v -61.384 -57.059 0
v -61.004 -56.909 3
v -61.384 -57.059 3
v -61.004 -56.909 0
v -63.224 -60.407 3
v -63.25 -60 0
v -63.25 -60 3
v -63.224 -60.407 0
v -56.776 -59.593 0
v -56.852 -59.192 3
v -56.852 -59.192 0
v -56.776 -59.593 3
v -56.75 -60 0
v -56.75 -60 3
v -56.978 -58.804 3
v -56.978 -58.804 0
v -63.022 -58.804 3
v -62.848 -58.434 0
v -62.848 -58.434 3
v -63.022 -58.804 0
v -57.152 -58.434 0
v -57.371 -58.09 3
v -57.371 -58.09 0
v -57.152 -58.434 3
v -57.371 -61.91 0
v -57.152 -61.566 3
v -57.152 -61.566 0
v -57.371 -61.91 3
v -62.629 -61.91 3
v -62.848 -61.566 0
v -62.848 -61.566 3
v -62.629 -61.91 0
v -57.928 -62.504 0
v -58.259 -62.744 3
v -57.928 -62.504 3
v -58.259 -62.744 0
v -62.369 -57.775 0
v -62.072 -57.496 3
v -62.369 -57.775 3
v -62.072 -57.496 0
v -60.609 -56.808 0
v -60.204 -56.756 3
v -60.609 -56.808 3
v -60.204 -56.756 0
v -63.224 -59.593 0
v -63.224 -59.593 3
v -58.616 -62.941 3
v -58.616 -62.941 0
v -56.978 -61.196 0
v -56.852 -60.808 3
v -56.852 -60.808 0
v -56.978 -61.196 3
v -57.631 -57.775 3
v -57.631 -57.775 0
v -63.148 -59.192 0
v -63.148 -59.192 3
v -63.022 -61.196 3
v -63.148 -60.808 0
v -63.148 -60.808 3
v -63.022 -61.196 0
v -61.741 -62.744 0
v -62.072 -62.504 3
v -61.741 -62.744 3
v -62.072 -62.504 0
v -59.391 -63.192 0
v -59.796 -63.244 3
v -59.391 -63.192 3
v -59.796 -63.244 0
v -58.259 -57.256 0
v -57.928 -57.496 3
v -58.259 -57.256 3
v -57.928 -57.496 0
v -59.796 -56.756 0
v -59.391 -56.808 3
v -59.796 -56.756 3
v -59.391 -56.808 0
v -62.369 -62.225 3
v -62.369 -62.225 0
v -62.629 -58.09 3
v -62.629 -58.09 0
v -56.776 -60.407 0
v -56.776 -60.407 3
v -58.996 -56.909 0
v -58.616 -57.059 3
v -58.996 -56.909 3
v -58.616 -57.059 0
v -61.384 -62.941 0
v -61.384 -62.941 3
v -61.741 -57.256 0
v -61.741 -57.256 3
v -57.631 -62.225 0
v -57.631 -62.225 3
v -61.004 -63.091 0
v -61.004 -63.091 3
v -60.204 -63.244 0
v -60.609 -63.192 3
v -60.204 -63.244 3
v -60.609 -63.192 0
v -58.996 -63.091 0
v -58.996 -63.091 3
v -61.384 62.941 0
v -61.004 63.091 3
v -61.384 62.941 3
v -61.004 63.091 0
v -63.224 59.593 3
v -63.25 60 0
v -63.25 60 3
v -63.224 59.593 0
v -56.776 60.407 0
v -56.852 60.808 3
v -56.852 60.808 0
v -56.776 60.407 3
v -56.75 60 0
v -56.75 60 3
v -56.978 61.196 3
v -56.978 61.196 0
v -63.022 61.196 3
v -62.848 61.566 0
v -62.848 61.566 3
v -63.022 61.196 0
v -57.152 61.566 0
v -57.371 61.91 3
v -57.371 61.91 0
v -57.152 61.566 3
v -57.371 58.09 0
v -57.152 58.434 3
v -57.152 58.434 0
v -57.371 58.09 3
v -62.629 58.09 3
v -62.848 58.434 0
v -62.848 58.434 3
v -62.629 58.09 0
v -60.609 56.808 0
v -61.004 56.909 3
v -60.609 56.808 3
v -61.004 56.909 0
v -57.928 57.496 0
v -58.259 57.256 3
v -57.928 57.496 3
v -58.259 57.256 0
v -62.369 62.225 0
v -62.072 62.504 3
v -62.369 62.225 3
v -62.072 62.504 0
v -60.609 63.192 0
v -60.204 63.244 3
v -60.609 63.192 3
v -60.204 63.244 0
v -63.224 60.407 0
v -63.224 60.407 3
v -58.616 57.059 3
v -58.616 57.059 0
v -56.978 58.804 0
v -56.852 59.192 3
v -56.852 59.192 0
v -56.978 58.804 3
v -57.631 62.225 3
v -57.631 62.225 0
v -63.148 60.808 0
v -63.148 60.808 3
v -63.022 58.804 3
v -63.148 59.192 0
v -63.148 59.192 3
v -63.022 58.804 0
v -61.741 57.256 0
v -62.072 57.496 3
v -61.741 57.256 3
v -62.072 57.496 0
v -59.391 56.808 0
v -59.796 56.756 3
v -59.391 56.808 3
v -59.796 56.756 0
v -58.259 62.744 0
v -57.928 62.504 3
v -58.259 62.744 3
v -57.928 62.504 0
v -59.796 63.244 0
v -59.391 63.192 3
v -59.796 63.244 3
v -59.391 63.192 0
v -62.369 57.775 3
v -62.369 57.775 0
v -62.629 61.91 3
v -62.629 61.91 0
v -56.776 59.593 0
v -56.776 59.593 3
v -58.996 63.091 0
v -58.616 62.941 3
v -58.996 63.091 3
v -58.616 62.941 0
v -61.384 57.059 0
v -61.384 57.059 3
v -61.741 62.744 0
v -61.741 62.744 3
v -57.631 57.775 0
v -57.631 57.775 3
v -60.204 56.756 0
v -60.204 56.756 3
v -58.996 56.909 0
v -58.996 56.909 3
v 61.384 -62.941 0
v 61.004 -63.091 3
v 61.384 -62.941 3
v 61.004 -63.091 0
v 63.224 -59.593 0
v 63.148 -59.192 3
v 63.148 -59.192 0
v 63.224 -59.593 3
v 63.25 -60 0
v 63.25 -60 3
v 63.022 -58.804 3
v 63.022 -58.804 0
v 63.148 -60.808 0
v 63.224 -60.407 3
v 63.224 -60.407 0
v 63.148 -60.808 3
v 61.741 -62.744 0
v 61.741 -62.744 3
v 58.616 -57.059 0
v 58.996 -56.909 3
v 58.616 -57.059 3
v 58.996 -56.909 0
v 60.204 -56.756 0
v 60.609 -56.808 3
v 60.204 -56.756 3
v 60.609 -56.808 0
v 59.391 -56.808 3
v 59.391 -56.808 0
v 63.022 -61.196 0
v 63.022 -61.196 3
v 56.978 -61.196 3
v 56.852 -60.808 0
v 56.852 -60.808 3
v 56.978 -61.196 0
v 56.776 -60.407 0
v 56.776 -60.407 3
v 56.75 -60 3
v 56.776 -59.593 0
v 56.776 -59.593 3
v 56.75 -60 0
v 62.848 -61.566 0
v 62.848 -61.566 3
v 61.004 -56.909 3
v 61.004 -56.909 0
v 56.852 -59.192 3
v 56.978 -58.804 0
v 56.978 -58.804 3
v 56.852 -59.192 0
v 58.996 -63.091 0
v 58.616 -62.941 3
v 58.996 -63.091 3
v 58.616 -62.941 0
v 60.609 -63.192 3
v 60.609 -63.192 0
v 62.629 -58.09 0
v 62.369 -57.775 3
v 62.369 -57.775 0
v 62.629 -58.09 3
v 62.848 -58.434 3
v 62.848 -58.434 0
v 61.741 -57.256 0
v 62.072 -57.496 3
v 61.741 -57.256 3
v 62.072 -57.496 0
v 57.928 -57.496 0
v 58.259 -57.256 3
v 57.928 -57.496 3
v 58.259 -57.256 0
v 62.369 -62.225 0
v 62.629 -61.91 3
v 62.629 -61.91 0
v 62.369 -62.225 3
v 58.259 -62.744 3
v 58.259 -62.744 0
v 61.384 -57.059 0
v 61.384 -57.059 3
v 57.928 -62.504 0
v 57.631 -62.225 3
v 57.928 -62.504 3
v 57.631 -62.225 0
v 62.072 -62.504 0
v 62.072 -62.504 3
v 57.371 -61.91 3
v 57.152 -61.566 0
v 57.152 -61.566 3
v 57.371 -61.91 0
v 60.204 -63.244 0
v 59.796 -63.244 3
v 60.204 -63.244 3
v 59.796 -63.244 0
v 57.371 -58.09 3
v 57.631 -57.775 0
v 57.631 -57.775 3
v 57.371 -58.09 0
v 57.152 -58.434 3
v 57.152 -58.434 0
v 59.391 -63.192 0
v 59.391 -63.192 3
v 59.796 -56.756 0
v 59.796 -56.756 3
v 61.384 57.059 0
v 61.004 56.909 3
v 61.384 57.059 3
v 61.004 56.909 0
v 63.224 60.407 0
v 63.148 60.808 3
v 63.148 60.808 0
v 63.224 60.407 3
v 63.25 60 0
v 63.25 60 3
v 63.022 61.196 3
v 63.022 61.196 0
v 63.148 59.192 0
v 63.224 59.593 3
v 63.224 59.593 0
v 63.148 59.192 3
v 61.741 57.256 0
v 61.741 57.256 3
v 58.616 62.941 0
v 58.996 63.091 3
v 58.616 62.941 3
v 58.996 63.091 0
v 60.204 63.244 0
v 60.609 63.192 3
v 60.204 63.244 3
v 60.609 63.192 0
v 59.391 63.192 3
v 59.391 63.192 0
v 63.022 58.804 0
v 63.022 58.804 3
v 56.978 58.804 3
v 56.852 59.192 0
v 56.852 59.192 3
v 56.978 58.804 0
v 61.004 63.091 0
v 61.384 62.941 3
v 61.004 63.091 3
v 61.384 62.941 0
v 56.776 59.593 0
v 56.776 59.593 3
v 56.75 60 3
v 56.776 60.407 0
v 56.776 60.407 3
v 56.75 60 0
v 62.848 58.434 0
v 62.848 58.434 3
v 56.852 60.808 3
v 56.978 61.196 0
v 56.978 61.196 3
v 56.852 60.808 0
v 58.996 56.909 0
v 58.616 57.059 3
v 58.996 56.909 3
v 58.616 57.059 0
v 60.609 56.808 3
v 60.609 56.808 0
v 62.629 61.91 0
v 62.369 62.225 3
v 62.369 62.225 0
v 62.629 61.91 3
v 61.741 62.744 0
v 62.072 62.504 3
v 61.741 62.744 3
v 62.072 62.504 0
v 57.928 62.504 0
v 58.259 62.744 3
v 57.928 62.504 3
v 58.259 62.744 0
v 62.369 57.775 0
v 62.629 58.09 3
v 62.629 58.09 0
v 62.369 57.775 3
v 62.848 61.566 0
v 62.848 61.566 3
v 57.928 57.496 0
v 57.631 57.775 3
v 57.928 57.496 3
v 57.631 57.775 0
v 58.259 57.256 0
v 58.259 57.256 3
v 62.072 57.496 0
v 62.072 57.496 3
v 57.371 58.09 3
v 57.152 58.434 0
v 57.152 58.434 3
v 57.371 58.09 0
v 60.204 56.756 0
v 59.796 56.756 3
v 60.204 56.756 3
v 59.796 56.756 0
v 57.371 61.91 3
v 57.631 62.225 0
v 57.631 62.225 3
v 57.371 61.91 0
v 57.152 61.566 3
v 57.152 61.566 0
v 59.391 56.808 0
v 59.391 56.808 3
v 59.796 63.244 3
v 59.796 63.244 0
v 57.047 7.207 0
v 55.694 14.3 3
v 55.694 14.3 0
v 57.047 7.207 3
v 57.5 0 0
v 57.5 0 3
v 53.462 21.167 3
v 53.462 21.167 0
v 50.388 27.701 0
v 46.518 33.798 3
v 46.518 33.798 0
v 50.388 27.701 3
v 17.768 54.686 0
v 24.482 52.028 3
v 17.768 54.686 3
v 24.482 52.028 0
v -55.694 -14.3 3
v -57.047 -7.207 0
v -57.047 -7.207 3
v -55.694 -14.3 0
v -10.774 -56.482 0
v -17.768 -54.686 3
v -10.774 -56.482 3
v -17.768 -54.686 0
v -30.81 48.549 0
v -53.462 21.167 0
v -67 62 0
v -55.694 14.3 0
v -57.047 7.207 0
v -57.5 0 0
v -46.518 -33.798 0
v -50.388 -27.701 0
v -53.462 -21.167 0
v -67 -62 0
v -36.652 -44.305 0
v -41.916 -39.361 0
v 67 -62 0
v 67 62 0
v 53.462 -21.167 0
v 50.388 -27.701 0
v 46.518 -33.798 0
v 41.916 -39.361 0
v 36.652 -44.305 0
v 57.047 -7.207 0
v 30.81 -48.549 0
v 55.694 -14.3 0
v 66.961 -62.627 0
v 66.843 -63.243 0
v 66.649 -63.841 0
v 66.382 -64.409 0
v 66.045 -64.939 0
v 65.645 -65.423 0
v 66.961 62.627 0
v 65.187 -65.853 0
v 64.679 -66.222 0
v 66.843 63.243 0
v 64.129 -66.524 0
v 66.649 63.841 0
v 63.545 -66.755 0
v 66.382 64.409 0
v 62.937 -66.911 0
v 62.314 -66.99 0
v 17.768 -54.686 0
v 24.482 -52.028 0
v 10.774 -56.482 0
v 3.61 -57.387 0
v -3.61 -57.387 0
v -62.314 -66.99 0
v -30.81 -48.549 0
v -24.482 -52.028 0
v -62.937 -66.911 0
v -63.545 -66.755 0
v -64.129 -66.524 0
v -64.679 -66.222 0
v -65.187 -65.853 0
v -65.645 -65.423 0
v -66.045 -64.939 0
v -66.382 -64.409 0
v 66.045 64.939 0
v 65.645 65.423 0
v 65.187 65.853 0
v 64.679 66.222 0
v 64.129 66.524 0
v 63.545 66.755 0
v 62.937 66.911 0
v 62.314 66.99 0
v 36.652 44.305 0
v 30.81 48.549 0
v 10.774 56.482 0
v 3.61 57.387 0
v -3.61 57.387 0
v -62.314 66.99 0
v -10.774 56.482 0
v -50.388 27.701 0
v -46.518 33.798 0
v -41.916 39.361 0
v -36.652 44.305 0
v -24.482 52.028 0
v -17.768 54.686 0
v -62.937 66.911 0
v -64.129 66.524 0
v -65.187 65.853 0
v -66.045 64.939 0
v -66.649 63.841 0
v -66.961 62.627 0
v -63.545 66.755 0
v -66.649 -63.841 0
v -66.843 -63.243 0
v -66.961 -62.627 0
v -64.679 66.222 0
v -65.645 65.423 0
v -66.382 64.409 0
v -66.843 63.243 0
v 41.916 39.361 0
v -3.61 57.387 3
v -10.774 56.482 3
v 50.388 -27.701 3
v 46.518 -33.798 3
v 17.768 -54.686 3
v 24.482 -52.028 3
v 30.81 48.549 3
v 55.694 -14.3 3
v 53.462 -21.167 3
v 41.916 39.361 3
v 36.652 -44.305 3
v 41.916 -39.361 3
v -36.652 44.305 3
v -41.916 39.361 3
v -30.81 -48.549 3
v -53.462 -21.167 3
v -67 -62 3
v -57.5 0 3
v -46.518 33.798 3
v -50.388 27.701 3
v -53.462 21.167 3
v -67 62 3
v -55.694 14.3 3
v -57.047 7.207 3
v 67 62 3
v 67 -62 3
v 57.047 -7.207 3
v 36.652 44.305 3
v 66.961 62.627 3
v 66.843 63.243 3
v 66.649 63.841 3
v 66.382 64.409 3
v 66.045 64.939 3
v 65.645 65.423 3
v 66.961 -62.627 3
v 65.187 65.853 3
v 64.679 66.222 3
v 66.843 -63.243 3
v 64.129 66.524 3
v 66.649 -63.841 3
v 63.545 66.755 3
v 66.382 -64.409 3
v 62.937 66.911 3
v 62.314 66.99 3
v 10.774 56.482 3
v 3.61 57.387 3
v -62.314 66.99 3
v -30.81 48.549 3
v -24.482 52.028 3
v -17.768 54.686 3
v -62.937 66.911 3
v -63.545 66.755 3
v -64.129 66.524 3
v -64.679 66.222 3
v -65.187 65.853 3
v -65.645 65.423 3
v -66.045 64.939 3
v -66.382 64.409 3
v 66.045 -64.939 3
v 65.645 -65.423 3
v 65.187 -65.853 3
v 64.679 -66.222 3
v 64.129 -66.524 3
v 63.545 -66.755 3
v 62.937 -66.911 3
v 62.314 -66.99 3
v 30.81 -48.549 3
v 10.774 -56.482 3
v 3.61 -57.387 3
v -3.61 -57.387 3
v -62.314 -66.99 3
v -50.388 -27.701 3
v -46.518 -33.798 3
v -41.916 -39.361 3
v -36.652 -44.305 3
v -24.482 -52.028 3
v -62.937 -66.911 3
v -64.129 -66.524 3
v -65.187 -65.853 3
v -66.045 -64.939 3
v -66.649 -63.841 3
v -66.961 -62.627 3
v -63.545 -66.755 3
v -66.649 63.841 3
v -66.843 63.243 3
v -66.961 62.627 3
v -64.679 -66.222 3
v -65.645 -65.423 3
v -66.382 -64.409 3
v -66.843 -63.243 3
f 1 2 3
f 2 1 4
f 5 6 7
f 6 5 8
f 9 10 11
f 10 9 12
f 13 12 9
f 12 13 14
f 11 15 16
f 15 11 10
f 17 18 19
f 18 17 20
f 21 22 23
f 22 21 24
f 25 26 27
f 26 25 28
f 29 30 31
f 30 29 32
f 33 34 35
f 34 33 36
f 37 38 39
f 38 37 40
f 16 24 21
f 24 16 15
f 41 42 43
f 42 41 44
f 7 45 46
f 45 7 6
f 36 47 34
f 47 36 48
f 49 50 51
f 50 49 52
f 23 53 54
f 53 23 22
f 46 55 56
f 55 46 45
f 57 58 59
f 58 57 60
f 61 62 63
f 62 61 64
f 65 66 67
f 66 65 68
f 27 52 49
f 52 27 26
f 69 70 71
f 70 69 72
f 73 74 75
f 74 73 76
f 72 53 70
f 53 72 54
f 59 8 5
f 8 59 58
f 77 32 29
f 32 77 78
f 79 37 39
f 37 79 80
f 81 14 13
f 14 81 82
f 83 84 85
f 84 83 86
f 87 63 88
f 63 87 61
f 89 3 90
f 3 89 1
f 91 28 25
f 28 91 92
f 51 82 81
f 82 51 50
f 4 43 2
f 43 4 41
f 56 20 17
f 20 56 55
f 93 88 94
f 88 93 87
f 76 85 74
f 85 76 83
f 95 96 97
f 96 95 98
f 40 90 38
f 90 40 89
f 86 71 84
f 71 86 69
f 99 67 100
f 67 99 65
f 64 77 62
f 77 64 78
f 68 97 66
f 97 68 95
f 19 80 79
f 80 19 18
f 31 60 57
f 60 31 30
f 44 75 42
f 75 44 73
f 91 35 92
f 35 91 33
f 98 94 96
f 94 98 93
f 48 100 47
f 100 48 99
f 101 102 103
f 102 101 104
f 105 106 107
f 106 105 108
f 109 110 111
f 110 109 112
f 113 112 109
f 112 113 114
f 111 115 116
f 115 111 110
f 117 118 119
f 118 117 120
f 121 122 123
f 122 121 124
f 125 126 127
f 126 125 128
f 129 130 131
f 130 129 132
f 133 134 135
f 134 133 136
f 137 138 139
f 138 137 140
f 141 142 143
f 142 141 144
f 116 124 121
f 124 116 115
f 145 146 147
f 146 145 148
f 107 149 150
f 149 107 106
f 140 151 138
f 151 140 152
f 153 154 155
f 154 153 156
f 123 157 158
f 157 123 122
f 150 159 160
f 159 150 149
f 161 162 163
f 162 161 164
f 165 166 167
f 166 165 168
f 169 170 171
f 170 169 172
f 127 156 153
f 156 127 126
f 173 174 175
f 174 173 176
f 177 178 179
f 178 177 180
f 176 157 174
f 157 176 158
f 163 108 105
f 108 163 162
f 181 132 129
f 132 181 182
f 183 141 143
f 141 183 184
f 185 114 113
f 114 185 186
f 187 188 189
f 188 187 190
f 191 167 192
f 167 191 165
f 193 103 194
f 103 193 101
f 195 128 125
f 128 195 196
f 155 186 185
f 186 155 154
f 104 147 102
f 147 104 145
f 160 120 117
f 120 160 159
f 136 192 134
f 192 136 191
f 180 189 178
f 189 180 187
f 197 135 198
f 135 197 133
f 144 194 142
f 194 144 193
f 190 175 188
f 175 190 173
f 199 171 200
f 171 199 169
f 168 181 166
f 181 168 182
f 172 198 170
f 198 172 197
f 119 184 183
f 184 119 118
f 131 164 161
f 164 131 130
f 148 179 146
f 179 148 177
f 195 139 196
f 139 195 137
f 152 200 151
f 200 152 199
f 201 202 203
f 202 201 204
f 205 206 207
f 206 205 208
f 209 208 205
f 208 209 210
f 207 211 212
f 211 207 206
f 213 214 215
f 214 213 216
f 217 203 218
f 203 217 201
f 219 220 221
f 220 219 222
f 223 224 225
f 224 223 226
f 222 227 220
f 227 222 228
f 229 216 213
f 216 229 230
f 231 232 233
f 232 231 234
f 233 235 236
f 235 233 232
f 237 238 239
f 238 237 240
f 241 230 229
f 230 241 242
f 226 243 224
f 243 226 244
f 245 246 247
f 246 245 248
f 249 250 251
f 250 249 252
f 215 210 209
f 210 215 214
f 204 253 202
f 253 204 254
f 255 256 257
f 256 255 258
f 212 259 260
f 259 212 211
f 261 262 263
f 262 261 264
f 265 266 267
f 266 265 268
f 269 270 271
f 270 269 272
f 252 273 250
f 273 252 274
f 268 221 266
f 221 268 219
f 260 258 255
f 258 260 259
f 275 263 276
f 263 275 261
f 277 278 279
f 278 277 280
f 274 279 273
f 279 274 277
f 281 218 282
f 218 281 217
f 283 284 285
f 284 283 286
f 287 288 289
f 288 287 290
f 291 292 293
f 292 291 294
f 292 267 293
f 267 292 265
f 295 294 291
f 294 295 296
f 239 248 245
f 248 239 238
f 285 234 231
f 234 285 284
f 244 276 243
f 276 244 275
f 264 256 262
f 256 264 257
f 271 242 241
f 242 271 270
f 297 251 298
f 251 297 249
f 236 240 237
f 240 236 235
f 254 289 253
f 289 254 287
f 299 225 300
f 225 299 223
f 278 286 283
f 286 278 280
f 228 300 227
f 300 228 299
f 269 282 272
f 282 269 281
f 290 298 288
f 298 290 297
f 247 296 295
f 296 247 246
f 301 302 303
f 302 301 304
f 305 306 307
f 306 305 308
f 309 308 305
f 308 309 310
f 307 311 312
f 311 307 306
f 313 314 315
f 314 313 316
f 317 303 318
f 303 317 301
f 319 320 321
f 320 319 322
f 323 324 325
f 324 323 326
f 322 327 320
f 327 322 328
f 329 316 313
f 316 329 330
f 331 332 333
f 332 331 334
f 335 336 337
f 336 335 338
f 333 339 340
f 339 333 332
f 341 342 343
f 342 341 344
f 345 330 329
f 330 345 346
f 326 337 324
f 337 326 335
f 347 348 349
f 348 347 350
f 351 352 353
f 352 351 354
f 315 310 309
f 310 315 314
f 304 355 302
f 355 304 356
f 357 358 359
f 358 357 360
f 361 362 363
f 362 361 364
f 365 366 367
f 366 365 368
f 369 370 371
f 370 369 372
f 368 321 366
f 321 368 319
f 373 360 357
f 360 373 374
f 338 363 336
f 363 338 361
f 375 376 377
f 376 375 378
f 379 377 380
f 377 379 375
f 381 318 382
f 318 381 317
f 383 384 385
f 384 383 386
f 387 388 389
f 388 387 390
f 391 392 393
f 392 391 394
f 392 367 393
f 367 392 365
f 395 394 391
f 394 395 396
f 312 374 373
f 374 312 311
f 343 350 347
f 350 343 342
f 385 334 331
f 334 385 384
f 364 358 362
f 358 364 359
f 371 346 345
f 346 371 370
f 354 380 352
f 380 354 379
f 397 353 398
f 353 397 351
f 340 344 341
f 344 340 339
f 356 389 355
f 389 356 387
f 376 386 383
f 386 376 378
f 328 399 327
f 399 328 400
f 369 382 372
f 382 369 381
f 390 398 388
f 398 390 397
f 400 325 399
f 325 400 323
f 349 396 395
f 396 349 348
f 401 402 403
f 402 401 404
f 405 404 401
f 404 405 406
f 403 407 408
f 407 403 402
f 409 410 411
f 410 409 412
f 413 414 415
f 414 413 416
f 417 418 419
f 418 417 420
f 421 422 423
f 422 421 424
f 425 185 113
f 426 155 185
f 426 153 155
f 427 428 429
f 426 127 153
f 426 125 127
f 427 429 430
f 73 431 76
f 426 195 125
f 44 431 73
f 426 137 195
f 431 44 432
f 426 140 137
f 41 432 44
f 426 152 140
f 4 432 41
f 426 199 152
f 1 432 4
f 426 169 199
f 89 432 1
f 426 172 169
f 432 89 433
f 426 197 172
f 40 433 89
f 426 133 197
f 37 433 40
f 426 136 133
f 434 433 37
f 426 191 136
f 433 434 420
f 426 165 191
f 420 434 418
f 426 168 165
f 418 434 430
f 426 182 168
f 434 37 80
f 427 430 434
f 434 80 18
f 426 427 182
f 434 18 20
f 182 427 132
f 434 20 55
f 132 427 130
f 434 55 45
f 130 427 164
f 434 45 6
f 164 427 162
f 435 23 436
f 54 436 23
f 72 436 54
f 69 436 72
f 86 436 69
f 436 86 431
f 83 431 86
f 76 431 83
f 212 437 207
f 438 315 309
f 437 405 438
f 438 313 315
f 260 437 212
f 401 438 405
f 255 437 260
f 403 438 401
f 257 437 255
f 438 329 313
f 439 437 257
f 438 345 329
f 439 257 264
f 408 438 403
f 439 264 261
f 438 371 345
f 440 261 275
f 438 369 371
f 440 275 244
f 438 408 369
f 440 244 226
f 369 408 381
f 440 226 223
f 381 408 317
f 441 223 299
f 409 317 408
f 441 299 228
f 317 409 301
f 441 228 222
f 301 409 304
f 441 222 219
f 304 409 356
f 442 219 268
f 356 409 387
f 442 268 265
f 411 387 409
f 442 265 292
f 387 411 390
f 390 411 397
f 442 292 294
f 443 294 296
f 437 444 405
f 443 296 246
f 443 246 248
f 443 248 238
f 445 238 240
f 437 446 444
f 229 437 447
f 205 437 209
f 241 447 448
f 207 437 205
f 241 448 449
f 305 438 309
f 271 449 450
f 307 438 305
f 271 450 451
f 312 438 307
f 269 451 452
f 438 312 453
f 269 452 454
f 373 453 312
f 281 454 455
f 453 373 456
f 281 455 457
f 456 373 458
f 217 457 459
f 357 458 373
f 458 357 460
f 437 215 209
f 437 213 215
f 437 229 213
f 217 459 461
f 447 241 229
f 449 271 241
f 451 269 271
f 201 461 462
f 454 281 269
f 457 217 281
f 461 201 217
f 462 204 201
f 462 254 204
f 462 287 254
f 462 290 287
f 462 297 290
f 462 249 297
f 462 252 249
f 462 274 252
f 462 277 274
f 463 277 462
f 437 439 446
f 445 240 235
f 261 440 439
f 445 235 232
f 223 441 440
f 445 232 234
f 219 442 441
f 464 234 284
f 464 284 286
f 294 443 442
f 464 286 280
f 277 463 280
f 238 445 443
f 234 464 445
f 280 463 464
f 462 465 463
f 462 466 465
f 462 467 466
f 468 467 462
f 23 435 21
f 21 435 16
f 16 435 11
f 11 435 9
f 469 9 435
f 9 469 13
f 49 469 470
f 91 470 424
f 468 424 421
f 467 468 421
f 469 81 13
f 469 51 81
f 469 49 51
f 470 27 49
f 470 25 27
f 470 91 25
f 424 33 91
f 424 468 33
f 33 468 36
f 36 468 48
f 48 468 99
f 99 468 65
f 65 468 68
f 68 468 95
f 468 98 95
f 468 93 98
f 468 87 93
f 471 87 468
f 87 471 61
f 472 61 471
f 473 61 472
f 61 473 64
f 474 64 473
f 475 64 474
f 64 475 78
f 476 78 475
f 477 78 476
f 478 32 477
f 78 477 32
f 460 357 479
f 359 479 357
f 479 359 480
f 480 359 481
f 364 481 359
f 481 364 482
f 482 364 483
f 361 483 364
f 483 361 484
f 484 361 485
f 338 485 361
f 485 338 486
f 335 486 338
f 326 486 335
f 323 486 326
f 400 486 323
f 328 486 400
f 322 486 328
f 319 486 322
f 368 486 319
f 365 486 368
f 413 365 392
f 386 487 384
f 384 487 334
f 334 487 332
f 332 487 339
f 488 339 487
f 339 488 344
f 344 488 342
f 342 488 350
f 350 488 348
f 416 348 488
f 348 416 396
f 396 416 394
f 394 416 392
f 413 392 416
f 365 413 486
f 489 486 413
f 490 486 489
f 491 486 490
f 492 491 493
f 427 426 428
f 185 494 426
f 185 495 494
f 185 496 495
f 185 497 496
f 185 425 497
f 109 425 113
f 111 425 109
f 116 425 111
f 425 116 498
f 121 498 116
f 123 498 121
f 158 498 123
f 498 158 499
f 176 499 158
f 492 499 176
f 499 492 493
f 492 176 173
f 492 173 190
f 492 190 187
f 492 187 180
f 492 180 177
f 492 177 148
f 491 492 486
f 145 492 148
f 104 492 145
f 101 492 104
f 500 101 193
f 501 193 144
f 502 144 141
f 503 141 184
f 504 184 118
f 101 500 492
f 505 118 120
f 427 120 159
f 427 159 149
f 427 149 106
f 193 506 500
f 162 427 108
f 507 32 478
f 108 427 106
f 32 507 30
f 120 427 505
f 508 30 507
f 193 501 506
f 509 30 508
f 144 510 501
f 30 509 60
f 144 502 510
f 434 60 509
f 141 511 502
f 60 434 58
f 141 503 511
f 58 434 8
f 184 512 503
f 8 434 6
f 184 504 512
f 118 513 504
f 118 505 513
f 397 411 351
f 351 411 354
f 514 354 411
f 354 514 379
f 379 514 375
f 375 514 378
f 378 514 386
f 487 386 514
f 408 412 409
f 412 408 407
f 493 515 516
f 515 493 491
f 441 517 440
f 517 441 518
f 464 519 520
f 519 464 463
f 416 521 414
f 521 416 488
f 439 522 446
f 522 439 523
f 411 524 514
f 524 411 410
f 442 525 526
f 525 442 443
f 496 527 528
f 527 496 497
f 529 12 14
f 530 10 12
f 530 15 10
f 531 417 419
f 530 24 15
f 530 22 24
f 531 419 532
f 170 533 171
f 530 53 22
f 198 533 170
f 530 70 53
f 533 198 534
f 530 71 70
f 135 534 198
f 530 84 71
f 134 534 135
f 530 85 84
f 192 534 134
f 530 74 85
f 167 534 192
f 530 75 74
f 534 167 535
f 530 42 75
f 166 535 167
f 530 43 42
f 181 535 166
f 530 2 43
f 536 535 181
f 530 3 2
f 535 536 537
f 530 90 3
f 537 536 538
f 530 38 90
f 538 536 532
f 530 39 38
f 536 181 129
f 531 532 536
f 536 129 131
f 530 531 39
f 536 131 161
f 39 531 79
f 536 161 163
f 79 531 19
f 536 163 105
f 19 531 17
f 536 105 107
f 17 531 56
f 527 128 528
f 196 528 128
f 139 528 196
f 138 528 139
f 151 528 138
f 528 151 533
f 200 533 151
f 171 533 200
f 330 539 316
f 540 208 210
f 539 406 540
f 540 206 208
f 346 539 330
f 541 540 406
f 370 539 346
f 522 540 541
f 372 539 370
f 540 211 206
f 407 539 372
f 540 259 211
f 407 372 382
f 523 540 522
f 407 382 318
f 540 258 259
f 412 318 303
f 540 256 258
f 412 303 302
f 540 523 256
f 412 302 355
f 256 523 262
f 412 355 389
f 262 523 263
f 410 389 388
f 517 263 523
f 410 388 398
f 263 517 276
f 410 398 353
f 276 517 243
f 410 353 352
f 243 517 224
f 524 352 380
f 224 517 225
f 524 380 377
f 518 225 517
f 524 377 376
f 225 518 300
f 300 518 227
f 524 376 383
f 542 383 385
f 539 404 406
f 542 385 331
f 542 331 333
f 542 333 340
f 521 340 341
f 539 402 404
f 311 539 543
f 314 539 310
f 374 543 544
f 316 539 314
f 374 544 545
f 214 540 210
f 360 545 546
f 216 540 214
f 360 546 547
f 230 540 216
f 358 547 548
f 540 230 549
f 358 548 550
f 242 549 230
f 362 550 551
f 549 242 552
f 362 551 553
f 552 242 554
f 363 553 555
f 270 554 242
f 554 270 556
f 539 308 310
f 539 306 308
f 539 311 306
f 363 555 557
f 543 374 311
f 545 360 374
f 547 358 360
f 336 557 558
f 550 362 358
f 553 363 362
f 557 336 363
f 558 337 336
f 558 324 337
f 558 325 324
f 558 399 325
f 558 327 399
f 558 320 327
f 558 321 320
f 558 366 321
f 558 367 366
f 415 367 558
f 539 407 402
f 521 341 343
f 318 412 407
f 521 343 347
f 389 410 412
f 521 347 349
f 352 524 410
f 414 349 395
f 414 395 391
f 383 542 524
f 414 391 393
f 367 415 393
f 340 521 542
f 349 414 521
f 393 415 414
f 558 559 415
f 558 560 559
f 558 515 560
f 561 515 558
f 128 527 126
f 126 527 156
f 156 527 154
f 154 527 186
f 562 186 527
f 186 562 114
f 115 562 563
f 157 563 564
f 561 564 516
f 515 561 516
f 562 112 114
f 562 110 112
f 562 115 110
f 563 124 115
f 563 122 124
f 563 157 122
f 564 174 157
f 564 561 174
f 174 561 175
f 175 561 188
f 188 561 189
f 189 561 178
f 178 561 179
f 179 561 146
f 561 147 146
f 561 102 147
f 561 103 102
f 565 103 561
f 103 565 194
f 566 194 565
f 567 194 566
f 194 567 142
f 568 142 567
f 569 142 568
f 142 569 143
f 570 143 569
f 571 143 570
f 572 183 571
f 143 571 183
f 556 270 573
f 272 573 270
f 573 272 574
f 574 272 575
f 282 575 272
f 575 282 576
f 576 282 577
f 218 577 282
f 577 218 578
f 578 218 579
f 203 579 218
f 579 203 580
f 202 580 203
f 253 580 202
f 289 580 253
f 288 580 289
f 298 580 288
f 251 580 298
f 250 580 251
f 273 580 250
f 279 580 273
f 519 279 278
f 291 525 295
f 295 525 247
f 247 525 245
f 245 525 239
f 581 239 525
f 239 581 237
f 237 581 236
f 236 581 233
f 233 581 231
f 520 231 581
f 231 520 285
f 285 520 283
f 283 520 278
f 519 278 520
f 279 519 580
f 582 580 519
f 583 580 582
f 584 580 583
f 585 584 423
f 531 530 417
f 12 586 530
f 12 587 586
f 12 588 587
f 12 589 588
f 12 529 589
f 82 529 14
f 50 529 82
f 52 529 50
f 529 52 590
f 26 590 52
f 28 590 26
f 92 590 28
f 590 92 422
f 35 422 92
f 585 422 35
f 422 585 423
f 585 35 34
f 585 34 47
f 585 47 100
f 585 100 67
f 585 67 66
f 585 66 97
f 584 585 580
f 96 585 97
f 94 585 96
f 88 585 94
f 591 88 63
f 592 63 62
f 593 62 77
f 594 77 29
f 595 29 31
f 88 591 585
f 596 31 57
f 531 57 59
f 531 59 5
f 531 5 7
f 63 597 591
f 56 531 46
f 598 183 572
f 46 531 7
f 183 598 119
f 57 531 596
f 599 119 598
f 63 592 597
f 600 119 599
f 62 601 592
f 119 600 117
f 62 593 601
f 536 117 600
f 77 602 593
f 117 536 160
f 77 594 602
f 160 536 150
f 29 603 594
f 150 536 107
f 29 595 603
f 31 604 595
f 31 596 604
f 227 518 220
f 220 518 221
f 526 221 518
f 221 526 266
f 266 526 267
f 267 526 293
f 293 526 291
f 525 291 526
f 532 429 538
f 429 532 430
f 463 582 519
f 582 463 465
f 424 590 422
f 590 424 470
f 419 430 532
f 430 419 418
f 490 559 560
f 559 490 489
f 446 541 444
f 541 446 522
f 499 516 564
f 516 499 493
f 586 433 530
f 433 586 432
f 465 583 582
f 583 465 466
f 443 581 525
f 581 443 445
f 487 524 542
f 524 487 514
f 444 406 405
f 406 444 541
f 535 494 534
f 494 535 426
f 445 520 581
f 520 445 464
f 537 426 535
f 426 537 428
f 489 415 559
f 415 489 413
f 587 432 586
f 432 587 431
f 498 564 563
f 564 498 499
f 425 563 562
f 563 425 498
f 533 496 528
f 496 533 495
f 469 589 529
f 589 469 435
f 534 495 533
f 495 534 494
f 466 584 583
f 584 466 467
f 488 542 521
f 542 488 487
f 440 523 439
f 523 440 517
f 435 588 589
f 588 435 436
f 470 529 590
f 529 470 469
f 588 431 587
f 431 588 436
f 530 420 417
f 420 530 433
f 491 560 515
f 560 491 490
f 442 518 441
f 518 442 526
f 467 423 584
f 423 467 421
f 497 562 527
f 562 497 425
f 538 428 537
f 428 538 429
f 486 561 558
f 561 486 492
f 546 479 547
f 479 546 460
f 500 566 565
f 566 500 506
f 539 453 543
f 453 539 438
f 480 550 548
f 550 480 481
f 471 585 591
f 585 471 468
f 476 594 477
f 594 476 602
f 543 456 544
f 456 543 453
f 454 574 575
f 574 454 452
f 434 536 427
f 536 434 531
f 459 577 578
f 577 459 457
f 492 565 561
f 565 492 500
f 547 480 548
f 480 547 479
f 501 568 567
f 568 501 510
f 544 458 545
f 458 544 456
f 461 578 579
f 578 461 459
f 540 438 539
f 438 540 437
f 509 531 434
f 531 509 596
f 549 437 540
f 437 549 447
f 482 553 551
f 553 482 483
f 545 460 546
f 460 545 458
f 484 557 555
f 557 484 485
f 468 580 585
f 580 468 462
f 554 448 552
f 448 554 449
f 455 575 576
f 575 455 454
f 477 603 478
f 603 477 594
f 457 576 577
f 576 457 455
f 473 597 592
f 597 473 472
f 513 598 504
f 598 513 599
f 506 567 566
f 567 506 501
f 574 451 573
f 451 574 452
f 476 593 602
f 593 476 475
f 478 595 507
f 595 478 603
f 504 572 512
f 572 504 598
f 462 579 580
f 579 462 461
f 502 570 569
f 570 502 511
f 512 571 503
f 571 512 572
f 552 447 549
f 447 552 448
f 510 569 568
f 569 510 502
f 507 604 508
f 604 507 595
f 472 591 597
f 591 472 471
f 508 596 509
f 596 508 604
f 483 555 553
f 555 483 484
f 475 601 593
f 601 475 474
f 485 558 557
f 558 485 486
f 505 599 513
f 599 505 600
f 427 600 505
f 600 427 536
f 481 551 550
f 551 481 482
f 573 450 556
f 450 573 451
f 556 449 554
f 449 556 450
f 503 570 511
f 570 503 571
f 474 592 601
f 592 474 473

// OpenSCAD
$fn = 50;

difference() {
	union() {
		hull() {
			translate(v = [-62.0, 62.0, 0]) {
				cylinder(h = 3, r = 5);
			}
			translate(v = [62.0, 62.0, 0]) {
				cylinder(h = 3, r = 5);
			}
			translate(v = [-62.0, -62.0, 0]) {
				cylinder(h = 3, r = 5);
			}
			translate(v = [62.0, -62.0, 0]) {
				cylinder(h = 3, r = 5);
			}
		}
	}
	union() {
		translate(v = [-60.0, -60.0, -100.0]) {
			cylinder(h = 200, r = 3.25);
		}
		translate(v = [-60.0, 60.0, -100.0]) {
			cylinder(h = 200, r = 3.25);
		}
		translate(v = [60.0, -60.0, -100.0]) {
			cylinder(h = 200, r = 3.25);
		}
		translate(v = [60.0, 60.0, -100.0]) {
			cylinder(h = 200, r = 3.25);
		}
		translate(v = [-60.0, -60.0, -100.0]) {
			cylinder(h = 200, r = 1.8);
		}
		translate(v = [-60.0, 60.0, -100.0]) {
			cylinder(h = 200, r = 1.8);
		}
		translate(v = [60.0, -60.0, -100.0]) {
			cylinder(h = 200, r = 1.8);
		}
		translate(v = [60.0, 60.0, -100.0]) {
			cylinder(h = 200, r = 1.8);
		}
		cylinder(h = 3, r = 57.5);
	}
}
